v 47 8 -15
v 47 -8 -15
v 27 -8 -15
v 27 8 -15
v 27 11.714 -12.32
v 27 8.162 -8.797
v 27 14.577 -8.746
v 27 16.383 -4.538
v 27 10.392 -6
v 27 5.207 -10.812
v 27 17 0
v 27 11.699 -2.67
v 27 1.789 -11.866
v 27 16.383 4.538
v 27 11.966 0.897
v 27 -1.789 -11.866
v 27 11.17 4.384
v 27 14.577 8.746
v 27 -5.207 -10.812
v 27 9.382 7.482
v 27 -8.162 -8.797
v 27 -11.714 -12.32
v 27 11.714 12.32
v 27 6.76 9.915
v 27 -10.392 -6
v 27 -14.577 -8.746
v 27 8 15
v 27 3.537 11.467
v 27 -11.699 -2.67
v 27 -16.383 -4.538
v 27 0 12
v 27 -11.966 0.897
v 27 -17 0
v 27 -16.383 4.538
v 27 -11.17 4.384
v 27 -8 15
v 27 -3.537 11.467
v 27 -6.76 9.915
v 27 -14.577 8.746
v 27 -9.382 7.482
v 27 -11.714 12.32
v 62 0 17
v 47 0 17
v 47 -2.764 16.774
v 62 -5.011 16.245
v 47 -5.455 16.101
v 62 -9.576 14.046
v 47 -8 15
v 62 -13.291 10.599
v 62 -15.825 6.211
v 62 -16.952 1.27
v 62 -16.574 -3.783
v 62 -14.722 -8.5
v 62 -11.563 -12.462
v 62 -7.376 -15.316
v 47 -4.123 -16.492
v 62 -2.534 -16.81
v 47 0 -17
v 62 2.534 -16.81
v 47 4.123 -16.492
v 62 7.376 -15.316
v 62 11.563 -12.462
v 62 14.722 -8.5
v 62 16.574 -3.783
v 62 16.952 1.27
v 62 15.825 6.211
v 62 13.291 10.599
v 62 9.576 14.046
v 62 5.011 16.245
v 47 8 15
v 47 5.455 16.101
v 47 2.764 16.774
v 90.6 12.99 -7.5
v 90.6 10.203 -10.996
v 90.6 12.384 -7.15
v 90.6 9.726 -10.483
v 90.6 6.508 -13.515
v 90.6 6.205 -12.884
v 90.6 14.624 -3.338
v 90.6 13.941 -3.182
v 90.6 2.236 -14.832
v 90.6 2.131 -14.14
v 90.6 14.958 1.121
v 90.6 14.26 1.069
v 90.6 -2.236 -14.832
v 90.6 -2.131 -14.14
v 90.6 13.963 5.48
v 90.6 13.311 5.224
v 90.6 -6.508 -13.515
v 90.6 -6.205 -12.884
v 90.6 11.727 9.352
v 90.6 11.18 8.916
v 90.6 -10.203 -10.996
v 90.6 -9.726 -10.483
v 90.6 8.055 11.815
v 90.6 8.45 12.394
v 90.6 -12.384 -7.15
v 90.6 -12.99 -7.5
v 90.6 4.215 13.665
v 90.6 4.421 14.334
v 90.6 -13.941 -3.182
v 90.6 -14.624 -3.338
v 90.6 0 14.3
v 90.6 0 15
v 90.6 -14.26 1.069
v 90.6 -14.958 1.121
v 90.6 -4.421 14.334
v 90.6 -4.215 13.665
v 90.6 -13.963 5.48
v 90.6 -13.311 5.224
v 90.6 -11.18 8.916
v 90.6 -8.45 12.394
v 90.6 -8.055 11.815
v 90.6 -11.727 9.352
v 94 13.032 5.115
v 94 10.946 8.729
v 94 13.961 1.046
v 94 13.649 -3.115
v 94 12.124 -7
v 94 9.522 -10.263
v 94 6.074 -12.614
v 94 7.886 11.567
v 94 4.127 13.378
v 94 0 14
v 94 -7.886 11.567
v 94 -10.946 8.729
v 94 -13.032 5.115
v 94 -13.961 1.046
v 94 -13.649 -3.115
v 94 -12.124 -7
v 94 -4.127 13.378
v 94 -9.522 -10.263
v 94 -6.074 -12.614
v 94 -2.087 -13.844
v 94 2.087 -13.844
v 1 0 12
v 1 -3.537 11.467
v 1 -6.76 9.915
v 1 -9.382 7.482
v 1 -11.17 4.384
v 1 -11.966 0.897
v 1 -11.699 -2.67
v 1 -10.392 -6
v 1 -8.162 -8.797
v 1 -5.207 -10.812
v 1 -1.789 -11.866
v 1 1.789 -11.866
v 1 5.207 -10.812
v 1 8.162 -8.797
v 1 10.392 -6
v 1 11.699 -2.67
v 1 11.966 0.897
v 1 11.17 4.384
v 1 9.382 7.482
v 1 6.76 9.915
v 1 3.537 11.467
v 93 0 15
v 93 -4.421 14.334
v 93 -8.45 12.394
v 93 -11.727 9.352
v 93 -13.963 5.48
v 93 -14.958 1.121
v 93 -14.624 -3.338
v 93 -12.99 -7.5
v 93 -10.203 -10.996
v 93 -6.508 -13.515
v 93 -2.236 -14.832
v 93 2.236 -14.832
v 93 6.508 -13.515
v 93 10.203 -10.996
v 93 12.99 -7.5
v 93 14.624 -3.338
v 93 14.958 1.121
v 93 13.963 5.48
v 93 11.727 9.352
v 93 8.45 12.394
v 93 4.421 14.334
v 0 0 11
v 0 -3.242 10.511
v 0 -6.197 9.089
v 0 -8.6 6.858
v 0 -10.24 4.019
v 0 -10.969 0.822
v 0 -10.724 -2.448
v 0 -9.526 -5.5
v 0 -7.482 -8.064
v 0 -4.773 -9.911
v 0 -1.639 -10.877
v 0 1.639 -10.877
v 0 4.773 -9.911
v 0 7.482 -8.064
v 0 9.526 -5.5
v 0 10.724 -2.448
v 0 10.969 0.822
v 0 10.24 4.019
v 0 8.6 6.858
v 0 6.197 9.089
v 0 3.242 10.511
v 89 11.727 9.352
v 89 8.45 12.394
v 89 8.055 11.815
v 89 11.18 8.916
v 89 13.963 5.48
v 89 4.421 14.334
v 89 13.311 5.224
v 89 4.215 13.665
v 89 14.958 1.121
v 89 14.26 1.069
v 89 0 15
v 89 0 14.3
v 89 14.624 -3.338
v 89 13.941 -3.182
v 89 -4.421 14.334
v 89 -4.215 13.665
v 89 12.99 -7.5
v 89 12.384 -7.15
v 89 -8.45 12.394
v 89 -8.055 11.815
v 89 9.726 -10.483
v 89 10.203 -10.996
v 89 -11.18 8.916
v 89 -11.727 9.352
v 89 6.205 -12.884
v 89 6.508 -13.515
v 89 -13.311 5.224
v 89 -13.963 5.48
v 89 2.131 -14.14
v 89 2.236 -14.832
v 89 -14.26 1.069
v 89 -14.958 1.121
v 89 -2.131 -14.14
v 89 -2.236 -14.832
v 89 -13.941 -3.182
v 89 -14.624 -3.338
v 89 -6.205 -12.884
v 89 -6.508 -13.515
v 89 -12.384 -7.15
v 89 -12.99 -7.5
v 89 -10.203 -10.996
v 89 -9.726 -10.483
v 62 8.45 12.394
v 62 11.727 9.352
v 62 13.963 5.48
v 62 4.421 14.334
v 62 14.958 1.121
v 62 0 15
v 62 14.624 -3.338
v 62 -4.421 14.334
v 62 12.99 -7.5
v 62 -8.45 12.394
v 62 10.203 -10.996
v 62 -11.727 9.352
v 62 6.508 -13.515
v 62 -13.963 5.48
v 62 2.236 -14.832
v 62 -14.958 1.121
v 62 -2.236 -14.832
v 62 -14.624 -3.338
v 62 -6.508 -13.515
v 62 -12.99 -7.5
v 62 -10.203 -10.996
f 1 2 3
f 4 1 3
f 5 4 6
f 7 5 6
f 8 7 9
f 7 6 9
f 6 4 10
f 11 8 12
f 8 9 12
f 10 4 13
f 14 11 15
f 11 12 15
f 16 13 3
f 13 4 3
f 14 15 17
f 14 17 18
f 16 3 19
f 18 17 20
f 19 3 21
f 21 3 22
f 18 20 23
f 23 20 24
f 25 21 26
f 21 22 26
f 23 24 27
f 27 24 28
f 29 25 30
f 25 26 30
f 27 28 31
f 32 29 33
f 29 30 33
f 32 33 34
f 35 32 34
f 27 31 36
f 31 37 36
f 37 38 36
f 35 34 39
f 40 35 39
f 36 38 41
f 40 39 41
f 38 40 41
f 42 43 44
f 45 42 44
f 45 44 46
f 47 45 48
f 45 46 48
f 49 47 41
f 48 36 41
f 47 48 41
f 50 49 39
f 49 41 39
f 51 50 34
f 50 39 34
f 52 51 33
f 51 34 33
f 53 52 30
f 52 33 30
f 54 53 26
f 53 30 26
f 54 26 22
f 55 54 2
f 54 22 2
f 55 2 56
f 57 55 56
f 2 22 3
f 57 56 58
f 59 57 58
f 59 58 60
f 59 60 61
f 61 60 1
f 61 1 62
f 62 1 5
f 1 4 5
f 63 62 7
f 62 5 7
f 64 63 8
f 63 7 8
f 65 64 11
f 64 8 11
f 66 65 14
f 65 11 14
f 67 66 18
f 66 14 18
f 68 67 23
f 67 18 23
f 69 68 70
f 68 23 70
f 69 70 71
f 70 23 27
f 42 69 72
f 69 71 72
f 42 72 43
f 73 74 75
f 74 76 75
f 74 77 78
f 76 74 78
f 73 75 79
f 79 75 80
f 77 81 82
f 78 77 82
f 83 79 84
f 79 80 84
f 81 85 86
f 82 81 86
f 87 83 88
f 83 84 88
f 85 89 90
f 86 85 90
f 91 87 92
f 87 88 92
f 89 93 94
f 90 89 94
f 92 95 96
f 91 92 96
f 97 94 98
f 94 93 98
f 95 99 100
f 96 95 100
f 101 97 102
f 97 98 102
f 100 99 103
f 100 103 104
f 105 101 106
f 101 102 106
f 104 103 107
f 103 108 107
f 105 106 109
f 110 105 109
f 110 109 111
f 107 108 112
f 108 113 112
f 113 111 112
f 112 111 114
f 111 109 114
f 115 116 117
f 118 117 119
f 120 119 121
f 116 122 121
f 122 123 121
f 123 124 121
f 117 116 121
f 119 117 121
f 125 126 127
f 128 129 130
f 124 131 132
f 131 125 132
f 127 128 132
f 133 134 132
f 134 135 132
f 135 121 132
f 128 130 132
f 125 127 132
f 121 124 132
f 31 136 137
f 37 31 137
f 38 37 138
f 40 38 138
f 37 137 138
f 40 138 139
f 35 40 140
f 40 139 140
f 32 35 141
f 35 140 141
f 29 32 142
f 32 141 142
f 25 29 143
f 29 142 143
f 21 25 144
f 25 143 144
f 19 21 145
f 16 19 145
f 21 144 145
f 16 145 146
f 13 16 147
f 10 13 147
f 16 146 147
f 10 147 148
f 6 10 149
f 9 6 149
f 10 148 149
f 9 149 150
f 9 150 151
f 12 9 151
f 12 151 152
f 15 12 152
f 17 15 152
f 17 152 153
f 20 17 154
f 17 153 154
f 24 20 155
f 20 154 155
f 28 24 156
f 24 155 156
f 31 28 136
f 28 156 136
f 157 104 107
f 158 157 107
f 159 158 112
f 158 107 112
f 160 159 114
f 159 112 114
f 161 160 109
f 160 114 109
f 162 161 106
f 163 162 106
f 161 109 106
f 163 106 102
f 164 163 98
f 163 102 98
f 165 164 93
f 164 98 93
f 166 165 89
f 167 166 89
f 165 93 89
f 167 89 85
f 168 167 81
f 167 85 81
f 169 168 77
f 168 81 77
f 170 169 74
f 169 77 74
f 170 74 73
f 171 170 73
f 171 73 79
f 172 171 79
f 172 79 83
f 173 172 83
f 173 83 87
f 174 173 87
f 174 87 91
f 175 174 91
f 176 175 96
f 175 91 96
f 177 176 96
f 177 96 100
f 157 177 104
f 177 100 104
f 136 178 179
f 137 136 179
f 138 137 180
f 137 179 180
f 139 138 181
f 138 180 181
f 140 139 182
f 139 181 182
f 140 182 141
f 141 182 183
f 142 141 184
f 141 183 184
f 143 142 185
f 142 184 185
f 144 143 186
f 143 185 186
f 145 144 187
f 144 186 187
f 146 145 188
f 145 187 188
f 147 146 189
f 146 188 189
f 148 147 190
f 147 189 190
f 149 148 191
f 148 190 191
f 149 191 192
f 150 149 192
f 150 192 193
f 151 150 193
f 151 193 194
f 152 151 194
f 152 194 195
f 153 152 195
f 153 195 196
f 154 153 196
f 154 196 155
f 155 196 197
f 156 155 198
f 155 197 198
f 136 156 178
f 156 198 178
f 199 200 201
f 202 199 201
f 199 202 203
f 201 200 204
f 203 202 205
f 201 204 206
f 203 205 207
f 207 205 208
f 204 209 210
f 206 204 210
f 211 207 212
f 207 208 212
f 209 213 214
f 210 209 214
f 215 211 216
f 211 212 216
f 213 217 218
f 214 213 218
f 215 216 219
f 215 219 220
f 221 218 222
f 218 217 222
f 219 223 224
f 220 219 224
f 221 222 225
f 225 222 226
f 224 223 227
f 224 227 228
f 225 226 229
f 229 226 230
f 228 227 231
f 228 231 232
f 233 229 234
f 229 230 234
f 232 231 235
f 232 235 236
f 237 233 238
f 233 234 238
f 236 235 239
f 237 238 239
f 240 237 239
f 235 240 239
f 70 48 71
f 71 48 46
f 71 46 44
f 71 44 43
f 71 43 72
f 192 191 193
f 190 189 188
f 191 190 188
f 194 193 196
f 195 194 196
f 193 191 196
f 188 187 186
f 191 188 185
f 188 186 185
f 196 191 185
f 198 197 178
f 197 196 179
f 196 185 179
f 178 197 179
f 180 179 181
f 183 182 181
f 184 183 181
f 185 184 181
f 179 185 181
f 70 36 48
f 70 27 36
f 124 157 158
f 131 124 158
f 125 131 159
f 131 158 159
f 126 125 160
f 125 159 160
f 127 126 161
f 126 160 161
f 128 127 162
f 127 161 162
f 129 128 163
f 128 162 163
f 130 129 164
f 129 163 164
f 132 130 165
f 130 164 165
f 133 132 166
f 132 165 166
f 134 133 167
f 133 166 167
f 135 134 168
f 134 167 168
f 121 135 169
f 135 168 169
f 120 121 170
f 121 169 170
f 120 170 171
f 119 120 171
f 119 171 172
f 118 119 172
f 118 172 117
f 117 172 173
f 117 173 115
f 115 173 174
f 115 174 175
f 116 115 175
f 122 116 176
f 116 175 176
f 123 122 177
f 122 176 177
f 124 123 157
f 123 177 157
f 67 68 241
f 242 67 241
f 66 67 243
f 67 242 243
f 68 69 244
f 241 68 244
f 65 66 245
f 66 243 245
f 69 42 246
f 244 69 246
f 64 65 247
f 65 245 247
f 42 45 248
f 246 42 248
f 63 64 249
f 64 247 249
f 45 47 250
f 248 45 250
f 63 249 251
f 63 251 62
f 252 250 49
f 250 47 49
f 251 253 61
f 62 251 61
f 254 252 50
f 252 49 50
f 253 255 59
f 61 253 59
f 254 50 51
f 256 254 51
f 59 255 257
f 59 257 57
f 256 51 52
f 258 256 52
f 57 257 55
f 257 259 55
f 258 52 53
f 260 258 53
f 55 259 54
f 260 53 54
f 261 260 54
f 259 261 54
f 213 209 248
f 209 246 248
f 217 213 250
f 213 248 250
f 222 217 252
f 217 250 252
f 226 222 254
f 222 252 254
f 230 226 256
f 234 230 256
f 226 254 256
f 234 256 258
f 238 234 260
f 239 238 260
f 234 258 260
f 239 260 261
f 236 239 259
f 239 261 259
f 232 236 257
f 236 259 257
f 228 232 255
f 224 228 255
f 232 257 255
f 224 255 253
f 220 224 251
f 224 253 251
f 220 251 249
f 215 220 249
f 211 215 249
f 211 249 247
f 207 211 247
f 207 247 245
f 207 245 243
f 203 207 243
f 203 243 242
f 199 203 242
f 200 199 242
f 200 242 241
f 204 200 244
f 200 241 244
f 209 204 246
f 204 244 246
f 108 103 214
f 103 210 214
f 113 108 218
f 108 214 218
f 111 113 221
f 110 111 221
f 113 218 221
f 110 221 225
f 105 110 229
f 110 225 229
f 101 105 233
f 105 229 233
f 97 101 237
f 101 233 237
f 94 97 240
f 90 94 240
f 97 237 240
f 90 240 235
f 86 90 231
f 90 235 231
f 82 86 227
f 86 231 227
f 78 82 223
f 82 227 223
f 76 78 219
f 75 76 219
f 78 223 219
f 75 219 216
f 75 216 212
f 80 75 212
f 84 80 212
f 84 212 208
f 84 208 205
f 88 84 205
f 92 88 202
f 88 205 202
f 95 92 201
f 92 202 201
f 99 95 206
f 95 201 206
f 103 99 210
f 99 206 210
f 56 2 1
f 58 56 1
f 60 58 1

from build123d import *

# Parameters (mm, degrees)
F2_SIZE  = 1
F3_SIZE  = 1
F5_DEPTH = 12.5


with BuildPart() as f1:
    # F0 (on Front) → F1 (revolve)
    with BuildSketch(Plane.XZ):
        Polygon((0, 12), (0, 0), (94, 0), (94, 15), (90.6, 15), (90.6, 14.3), (89, 14.3), (89, 15), (62, 15), (62, 17), (27, 17), (27, 12), align=None)
    revolve(axis=Axis((47, 0, 0), (1, 0, 0)))

    # F2
    f2_edges = [f1.edges().sort_by_distance(p)[0] for p in [
        (94, 0, -15),
    ]]
    chamfer(f2_edges, length=F2_SIZE)

    # F3
    f3_edges = [f1.edges().sort_by_distance(p)[0] for p in [
        (0, 0, -12),
    ]]
    chamfer(f3_edges, length=F3_SIZE)

    # F4 (on Front) → F5 (cut, symmetric)
    with BuildSketch(Plane.XZ):
        Polygon((25.7335081697, 20.8393707871), (25.413043797, 15), (27, 15), (47, 15), (47, 20.8393707871), align=None)
        Polygon((47, -15), (27, -15), (25.413043797, -15), (25.7335081697, -20.8393707871), (47, -20.8393707871), (47, -17), align=None)
    extrude(amount=F5_DEPTH, both=True, mode=Mode.SUBTRACT)


solid = f1.part
